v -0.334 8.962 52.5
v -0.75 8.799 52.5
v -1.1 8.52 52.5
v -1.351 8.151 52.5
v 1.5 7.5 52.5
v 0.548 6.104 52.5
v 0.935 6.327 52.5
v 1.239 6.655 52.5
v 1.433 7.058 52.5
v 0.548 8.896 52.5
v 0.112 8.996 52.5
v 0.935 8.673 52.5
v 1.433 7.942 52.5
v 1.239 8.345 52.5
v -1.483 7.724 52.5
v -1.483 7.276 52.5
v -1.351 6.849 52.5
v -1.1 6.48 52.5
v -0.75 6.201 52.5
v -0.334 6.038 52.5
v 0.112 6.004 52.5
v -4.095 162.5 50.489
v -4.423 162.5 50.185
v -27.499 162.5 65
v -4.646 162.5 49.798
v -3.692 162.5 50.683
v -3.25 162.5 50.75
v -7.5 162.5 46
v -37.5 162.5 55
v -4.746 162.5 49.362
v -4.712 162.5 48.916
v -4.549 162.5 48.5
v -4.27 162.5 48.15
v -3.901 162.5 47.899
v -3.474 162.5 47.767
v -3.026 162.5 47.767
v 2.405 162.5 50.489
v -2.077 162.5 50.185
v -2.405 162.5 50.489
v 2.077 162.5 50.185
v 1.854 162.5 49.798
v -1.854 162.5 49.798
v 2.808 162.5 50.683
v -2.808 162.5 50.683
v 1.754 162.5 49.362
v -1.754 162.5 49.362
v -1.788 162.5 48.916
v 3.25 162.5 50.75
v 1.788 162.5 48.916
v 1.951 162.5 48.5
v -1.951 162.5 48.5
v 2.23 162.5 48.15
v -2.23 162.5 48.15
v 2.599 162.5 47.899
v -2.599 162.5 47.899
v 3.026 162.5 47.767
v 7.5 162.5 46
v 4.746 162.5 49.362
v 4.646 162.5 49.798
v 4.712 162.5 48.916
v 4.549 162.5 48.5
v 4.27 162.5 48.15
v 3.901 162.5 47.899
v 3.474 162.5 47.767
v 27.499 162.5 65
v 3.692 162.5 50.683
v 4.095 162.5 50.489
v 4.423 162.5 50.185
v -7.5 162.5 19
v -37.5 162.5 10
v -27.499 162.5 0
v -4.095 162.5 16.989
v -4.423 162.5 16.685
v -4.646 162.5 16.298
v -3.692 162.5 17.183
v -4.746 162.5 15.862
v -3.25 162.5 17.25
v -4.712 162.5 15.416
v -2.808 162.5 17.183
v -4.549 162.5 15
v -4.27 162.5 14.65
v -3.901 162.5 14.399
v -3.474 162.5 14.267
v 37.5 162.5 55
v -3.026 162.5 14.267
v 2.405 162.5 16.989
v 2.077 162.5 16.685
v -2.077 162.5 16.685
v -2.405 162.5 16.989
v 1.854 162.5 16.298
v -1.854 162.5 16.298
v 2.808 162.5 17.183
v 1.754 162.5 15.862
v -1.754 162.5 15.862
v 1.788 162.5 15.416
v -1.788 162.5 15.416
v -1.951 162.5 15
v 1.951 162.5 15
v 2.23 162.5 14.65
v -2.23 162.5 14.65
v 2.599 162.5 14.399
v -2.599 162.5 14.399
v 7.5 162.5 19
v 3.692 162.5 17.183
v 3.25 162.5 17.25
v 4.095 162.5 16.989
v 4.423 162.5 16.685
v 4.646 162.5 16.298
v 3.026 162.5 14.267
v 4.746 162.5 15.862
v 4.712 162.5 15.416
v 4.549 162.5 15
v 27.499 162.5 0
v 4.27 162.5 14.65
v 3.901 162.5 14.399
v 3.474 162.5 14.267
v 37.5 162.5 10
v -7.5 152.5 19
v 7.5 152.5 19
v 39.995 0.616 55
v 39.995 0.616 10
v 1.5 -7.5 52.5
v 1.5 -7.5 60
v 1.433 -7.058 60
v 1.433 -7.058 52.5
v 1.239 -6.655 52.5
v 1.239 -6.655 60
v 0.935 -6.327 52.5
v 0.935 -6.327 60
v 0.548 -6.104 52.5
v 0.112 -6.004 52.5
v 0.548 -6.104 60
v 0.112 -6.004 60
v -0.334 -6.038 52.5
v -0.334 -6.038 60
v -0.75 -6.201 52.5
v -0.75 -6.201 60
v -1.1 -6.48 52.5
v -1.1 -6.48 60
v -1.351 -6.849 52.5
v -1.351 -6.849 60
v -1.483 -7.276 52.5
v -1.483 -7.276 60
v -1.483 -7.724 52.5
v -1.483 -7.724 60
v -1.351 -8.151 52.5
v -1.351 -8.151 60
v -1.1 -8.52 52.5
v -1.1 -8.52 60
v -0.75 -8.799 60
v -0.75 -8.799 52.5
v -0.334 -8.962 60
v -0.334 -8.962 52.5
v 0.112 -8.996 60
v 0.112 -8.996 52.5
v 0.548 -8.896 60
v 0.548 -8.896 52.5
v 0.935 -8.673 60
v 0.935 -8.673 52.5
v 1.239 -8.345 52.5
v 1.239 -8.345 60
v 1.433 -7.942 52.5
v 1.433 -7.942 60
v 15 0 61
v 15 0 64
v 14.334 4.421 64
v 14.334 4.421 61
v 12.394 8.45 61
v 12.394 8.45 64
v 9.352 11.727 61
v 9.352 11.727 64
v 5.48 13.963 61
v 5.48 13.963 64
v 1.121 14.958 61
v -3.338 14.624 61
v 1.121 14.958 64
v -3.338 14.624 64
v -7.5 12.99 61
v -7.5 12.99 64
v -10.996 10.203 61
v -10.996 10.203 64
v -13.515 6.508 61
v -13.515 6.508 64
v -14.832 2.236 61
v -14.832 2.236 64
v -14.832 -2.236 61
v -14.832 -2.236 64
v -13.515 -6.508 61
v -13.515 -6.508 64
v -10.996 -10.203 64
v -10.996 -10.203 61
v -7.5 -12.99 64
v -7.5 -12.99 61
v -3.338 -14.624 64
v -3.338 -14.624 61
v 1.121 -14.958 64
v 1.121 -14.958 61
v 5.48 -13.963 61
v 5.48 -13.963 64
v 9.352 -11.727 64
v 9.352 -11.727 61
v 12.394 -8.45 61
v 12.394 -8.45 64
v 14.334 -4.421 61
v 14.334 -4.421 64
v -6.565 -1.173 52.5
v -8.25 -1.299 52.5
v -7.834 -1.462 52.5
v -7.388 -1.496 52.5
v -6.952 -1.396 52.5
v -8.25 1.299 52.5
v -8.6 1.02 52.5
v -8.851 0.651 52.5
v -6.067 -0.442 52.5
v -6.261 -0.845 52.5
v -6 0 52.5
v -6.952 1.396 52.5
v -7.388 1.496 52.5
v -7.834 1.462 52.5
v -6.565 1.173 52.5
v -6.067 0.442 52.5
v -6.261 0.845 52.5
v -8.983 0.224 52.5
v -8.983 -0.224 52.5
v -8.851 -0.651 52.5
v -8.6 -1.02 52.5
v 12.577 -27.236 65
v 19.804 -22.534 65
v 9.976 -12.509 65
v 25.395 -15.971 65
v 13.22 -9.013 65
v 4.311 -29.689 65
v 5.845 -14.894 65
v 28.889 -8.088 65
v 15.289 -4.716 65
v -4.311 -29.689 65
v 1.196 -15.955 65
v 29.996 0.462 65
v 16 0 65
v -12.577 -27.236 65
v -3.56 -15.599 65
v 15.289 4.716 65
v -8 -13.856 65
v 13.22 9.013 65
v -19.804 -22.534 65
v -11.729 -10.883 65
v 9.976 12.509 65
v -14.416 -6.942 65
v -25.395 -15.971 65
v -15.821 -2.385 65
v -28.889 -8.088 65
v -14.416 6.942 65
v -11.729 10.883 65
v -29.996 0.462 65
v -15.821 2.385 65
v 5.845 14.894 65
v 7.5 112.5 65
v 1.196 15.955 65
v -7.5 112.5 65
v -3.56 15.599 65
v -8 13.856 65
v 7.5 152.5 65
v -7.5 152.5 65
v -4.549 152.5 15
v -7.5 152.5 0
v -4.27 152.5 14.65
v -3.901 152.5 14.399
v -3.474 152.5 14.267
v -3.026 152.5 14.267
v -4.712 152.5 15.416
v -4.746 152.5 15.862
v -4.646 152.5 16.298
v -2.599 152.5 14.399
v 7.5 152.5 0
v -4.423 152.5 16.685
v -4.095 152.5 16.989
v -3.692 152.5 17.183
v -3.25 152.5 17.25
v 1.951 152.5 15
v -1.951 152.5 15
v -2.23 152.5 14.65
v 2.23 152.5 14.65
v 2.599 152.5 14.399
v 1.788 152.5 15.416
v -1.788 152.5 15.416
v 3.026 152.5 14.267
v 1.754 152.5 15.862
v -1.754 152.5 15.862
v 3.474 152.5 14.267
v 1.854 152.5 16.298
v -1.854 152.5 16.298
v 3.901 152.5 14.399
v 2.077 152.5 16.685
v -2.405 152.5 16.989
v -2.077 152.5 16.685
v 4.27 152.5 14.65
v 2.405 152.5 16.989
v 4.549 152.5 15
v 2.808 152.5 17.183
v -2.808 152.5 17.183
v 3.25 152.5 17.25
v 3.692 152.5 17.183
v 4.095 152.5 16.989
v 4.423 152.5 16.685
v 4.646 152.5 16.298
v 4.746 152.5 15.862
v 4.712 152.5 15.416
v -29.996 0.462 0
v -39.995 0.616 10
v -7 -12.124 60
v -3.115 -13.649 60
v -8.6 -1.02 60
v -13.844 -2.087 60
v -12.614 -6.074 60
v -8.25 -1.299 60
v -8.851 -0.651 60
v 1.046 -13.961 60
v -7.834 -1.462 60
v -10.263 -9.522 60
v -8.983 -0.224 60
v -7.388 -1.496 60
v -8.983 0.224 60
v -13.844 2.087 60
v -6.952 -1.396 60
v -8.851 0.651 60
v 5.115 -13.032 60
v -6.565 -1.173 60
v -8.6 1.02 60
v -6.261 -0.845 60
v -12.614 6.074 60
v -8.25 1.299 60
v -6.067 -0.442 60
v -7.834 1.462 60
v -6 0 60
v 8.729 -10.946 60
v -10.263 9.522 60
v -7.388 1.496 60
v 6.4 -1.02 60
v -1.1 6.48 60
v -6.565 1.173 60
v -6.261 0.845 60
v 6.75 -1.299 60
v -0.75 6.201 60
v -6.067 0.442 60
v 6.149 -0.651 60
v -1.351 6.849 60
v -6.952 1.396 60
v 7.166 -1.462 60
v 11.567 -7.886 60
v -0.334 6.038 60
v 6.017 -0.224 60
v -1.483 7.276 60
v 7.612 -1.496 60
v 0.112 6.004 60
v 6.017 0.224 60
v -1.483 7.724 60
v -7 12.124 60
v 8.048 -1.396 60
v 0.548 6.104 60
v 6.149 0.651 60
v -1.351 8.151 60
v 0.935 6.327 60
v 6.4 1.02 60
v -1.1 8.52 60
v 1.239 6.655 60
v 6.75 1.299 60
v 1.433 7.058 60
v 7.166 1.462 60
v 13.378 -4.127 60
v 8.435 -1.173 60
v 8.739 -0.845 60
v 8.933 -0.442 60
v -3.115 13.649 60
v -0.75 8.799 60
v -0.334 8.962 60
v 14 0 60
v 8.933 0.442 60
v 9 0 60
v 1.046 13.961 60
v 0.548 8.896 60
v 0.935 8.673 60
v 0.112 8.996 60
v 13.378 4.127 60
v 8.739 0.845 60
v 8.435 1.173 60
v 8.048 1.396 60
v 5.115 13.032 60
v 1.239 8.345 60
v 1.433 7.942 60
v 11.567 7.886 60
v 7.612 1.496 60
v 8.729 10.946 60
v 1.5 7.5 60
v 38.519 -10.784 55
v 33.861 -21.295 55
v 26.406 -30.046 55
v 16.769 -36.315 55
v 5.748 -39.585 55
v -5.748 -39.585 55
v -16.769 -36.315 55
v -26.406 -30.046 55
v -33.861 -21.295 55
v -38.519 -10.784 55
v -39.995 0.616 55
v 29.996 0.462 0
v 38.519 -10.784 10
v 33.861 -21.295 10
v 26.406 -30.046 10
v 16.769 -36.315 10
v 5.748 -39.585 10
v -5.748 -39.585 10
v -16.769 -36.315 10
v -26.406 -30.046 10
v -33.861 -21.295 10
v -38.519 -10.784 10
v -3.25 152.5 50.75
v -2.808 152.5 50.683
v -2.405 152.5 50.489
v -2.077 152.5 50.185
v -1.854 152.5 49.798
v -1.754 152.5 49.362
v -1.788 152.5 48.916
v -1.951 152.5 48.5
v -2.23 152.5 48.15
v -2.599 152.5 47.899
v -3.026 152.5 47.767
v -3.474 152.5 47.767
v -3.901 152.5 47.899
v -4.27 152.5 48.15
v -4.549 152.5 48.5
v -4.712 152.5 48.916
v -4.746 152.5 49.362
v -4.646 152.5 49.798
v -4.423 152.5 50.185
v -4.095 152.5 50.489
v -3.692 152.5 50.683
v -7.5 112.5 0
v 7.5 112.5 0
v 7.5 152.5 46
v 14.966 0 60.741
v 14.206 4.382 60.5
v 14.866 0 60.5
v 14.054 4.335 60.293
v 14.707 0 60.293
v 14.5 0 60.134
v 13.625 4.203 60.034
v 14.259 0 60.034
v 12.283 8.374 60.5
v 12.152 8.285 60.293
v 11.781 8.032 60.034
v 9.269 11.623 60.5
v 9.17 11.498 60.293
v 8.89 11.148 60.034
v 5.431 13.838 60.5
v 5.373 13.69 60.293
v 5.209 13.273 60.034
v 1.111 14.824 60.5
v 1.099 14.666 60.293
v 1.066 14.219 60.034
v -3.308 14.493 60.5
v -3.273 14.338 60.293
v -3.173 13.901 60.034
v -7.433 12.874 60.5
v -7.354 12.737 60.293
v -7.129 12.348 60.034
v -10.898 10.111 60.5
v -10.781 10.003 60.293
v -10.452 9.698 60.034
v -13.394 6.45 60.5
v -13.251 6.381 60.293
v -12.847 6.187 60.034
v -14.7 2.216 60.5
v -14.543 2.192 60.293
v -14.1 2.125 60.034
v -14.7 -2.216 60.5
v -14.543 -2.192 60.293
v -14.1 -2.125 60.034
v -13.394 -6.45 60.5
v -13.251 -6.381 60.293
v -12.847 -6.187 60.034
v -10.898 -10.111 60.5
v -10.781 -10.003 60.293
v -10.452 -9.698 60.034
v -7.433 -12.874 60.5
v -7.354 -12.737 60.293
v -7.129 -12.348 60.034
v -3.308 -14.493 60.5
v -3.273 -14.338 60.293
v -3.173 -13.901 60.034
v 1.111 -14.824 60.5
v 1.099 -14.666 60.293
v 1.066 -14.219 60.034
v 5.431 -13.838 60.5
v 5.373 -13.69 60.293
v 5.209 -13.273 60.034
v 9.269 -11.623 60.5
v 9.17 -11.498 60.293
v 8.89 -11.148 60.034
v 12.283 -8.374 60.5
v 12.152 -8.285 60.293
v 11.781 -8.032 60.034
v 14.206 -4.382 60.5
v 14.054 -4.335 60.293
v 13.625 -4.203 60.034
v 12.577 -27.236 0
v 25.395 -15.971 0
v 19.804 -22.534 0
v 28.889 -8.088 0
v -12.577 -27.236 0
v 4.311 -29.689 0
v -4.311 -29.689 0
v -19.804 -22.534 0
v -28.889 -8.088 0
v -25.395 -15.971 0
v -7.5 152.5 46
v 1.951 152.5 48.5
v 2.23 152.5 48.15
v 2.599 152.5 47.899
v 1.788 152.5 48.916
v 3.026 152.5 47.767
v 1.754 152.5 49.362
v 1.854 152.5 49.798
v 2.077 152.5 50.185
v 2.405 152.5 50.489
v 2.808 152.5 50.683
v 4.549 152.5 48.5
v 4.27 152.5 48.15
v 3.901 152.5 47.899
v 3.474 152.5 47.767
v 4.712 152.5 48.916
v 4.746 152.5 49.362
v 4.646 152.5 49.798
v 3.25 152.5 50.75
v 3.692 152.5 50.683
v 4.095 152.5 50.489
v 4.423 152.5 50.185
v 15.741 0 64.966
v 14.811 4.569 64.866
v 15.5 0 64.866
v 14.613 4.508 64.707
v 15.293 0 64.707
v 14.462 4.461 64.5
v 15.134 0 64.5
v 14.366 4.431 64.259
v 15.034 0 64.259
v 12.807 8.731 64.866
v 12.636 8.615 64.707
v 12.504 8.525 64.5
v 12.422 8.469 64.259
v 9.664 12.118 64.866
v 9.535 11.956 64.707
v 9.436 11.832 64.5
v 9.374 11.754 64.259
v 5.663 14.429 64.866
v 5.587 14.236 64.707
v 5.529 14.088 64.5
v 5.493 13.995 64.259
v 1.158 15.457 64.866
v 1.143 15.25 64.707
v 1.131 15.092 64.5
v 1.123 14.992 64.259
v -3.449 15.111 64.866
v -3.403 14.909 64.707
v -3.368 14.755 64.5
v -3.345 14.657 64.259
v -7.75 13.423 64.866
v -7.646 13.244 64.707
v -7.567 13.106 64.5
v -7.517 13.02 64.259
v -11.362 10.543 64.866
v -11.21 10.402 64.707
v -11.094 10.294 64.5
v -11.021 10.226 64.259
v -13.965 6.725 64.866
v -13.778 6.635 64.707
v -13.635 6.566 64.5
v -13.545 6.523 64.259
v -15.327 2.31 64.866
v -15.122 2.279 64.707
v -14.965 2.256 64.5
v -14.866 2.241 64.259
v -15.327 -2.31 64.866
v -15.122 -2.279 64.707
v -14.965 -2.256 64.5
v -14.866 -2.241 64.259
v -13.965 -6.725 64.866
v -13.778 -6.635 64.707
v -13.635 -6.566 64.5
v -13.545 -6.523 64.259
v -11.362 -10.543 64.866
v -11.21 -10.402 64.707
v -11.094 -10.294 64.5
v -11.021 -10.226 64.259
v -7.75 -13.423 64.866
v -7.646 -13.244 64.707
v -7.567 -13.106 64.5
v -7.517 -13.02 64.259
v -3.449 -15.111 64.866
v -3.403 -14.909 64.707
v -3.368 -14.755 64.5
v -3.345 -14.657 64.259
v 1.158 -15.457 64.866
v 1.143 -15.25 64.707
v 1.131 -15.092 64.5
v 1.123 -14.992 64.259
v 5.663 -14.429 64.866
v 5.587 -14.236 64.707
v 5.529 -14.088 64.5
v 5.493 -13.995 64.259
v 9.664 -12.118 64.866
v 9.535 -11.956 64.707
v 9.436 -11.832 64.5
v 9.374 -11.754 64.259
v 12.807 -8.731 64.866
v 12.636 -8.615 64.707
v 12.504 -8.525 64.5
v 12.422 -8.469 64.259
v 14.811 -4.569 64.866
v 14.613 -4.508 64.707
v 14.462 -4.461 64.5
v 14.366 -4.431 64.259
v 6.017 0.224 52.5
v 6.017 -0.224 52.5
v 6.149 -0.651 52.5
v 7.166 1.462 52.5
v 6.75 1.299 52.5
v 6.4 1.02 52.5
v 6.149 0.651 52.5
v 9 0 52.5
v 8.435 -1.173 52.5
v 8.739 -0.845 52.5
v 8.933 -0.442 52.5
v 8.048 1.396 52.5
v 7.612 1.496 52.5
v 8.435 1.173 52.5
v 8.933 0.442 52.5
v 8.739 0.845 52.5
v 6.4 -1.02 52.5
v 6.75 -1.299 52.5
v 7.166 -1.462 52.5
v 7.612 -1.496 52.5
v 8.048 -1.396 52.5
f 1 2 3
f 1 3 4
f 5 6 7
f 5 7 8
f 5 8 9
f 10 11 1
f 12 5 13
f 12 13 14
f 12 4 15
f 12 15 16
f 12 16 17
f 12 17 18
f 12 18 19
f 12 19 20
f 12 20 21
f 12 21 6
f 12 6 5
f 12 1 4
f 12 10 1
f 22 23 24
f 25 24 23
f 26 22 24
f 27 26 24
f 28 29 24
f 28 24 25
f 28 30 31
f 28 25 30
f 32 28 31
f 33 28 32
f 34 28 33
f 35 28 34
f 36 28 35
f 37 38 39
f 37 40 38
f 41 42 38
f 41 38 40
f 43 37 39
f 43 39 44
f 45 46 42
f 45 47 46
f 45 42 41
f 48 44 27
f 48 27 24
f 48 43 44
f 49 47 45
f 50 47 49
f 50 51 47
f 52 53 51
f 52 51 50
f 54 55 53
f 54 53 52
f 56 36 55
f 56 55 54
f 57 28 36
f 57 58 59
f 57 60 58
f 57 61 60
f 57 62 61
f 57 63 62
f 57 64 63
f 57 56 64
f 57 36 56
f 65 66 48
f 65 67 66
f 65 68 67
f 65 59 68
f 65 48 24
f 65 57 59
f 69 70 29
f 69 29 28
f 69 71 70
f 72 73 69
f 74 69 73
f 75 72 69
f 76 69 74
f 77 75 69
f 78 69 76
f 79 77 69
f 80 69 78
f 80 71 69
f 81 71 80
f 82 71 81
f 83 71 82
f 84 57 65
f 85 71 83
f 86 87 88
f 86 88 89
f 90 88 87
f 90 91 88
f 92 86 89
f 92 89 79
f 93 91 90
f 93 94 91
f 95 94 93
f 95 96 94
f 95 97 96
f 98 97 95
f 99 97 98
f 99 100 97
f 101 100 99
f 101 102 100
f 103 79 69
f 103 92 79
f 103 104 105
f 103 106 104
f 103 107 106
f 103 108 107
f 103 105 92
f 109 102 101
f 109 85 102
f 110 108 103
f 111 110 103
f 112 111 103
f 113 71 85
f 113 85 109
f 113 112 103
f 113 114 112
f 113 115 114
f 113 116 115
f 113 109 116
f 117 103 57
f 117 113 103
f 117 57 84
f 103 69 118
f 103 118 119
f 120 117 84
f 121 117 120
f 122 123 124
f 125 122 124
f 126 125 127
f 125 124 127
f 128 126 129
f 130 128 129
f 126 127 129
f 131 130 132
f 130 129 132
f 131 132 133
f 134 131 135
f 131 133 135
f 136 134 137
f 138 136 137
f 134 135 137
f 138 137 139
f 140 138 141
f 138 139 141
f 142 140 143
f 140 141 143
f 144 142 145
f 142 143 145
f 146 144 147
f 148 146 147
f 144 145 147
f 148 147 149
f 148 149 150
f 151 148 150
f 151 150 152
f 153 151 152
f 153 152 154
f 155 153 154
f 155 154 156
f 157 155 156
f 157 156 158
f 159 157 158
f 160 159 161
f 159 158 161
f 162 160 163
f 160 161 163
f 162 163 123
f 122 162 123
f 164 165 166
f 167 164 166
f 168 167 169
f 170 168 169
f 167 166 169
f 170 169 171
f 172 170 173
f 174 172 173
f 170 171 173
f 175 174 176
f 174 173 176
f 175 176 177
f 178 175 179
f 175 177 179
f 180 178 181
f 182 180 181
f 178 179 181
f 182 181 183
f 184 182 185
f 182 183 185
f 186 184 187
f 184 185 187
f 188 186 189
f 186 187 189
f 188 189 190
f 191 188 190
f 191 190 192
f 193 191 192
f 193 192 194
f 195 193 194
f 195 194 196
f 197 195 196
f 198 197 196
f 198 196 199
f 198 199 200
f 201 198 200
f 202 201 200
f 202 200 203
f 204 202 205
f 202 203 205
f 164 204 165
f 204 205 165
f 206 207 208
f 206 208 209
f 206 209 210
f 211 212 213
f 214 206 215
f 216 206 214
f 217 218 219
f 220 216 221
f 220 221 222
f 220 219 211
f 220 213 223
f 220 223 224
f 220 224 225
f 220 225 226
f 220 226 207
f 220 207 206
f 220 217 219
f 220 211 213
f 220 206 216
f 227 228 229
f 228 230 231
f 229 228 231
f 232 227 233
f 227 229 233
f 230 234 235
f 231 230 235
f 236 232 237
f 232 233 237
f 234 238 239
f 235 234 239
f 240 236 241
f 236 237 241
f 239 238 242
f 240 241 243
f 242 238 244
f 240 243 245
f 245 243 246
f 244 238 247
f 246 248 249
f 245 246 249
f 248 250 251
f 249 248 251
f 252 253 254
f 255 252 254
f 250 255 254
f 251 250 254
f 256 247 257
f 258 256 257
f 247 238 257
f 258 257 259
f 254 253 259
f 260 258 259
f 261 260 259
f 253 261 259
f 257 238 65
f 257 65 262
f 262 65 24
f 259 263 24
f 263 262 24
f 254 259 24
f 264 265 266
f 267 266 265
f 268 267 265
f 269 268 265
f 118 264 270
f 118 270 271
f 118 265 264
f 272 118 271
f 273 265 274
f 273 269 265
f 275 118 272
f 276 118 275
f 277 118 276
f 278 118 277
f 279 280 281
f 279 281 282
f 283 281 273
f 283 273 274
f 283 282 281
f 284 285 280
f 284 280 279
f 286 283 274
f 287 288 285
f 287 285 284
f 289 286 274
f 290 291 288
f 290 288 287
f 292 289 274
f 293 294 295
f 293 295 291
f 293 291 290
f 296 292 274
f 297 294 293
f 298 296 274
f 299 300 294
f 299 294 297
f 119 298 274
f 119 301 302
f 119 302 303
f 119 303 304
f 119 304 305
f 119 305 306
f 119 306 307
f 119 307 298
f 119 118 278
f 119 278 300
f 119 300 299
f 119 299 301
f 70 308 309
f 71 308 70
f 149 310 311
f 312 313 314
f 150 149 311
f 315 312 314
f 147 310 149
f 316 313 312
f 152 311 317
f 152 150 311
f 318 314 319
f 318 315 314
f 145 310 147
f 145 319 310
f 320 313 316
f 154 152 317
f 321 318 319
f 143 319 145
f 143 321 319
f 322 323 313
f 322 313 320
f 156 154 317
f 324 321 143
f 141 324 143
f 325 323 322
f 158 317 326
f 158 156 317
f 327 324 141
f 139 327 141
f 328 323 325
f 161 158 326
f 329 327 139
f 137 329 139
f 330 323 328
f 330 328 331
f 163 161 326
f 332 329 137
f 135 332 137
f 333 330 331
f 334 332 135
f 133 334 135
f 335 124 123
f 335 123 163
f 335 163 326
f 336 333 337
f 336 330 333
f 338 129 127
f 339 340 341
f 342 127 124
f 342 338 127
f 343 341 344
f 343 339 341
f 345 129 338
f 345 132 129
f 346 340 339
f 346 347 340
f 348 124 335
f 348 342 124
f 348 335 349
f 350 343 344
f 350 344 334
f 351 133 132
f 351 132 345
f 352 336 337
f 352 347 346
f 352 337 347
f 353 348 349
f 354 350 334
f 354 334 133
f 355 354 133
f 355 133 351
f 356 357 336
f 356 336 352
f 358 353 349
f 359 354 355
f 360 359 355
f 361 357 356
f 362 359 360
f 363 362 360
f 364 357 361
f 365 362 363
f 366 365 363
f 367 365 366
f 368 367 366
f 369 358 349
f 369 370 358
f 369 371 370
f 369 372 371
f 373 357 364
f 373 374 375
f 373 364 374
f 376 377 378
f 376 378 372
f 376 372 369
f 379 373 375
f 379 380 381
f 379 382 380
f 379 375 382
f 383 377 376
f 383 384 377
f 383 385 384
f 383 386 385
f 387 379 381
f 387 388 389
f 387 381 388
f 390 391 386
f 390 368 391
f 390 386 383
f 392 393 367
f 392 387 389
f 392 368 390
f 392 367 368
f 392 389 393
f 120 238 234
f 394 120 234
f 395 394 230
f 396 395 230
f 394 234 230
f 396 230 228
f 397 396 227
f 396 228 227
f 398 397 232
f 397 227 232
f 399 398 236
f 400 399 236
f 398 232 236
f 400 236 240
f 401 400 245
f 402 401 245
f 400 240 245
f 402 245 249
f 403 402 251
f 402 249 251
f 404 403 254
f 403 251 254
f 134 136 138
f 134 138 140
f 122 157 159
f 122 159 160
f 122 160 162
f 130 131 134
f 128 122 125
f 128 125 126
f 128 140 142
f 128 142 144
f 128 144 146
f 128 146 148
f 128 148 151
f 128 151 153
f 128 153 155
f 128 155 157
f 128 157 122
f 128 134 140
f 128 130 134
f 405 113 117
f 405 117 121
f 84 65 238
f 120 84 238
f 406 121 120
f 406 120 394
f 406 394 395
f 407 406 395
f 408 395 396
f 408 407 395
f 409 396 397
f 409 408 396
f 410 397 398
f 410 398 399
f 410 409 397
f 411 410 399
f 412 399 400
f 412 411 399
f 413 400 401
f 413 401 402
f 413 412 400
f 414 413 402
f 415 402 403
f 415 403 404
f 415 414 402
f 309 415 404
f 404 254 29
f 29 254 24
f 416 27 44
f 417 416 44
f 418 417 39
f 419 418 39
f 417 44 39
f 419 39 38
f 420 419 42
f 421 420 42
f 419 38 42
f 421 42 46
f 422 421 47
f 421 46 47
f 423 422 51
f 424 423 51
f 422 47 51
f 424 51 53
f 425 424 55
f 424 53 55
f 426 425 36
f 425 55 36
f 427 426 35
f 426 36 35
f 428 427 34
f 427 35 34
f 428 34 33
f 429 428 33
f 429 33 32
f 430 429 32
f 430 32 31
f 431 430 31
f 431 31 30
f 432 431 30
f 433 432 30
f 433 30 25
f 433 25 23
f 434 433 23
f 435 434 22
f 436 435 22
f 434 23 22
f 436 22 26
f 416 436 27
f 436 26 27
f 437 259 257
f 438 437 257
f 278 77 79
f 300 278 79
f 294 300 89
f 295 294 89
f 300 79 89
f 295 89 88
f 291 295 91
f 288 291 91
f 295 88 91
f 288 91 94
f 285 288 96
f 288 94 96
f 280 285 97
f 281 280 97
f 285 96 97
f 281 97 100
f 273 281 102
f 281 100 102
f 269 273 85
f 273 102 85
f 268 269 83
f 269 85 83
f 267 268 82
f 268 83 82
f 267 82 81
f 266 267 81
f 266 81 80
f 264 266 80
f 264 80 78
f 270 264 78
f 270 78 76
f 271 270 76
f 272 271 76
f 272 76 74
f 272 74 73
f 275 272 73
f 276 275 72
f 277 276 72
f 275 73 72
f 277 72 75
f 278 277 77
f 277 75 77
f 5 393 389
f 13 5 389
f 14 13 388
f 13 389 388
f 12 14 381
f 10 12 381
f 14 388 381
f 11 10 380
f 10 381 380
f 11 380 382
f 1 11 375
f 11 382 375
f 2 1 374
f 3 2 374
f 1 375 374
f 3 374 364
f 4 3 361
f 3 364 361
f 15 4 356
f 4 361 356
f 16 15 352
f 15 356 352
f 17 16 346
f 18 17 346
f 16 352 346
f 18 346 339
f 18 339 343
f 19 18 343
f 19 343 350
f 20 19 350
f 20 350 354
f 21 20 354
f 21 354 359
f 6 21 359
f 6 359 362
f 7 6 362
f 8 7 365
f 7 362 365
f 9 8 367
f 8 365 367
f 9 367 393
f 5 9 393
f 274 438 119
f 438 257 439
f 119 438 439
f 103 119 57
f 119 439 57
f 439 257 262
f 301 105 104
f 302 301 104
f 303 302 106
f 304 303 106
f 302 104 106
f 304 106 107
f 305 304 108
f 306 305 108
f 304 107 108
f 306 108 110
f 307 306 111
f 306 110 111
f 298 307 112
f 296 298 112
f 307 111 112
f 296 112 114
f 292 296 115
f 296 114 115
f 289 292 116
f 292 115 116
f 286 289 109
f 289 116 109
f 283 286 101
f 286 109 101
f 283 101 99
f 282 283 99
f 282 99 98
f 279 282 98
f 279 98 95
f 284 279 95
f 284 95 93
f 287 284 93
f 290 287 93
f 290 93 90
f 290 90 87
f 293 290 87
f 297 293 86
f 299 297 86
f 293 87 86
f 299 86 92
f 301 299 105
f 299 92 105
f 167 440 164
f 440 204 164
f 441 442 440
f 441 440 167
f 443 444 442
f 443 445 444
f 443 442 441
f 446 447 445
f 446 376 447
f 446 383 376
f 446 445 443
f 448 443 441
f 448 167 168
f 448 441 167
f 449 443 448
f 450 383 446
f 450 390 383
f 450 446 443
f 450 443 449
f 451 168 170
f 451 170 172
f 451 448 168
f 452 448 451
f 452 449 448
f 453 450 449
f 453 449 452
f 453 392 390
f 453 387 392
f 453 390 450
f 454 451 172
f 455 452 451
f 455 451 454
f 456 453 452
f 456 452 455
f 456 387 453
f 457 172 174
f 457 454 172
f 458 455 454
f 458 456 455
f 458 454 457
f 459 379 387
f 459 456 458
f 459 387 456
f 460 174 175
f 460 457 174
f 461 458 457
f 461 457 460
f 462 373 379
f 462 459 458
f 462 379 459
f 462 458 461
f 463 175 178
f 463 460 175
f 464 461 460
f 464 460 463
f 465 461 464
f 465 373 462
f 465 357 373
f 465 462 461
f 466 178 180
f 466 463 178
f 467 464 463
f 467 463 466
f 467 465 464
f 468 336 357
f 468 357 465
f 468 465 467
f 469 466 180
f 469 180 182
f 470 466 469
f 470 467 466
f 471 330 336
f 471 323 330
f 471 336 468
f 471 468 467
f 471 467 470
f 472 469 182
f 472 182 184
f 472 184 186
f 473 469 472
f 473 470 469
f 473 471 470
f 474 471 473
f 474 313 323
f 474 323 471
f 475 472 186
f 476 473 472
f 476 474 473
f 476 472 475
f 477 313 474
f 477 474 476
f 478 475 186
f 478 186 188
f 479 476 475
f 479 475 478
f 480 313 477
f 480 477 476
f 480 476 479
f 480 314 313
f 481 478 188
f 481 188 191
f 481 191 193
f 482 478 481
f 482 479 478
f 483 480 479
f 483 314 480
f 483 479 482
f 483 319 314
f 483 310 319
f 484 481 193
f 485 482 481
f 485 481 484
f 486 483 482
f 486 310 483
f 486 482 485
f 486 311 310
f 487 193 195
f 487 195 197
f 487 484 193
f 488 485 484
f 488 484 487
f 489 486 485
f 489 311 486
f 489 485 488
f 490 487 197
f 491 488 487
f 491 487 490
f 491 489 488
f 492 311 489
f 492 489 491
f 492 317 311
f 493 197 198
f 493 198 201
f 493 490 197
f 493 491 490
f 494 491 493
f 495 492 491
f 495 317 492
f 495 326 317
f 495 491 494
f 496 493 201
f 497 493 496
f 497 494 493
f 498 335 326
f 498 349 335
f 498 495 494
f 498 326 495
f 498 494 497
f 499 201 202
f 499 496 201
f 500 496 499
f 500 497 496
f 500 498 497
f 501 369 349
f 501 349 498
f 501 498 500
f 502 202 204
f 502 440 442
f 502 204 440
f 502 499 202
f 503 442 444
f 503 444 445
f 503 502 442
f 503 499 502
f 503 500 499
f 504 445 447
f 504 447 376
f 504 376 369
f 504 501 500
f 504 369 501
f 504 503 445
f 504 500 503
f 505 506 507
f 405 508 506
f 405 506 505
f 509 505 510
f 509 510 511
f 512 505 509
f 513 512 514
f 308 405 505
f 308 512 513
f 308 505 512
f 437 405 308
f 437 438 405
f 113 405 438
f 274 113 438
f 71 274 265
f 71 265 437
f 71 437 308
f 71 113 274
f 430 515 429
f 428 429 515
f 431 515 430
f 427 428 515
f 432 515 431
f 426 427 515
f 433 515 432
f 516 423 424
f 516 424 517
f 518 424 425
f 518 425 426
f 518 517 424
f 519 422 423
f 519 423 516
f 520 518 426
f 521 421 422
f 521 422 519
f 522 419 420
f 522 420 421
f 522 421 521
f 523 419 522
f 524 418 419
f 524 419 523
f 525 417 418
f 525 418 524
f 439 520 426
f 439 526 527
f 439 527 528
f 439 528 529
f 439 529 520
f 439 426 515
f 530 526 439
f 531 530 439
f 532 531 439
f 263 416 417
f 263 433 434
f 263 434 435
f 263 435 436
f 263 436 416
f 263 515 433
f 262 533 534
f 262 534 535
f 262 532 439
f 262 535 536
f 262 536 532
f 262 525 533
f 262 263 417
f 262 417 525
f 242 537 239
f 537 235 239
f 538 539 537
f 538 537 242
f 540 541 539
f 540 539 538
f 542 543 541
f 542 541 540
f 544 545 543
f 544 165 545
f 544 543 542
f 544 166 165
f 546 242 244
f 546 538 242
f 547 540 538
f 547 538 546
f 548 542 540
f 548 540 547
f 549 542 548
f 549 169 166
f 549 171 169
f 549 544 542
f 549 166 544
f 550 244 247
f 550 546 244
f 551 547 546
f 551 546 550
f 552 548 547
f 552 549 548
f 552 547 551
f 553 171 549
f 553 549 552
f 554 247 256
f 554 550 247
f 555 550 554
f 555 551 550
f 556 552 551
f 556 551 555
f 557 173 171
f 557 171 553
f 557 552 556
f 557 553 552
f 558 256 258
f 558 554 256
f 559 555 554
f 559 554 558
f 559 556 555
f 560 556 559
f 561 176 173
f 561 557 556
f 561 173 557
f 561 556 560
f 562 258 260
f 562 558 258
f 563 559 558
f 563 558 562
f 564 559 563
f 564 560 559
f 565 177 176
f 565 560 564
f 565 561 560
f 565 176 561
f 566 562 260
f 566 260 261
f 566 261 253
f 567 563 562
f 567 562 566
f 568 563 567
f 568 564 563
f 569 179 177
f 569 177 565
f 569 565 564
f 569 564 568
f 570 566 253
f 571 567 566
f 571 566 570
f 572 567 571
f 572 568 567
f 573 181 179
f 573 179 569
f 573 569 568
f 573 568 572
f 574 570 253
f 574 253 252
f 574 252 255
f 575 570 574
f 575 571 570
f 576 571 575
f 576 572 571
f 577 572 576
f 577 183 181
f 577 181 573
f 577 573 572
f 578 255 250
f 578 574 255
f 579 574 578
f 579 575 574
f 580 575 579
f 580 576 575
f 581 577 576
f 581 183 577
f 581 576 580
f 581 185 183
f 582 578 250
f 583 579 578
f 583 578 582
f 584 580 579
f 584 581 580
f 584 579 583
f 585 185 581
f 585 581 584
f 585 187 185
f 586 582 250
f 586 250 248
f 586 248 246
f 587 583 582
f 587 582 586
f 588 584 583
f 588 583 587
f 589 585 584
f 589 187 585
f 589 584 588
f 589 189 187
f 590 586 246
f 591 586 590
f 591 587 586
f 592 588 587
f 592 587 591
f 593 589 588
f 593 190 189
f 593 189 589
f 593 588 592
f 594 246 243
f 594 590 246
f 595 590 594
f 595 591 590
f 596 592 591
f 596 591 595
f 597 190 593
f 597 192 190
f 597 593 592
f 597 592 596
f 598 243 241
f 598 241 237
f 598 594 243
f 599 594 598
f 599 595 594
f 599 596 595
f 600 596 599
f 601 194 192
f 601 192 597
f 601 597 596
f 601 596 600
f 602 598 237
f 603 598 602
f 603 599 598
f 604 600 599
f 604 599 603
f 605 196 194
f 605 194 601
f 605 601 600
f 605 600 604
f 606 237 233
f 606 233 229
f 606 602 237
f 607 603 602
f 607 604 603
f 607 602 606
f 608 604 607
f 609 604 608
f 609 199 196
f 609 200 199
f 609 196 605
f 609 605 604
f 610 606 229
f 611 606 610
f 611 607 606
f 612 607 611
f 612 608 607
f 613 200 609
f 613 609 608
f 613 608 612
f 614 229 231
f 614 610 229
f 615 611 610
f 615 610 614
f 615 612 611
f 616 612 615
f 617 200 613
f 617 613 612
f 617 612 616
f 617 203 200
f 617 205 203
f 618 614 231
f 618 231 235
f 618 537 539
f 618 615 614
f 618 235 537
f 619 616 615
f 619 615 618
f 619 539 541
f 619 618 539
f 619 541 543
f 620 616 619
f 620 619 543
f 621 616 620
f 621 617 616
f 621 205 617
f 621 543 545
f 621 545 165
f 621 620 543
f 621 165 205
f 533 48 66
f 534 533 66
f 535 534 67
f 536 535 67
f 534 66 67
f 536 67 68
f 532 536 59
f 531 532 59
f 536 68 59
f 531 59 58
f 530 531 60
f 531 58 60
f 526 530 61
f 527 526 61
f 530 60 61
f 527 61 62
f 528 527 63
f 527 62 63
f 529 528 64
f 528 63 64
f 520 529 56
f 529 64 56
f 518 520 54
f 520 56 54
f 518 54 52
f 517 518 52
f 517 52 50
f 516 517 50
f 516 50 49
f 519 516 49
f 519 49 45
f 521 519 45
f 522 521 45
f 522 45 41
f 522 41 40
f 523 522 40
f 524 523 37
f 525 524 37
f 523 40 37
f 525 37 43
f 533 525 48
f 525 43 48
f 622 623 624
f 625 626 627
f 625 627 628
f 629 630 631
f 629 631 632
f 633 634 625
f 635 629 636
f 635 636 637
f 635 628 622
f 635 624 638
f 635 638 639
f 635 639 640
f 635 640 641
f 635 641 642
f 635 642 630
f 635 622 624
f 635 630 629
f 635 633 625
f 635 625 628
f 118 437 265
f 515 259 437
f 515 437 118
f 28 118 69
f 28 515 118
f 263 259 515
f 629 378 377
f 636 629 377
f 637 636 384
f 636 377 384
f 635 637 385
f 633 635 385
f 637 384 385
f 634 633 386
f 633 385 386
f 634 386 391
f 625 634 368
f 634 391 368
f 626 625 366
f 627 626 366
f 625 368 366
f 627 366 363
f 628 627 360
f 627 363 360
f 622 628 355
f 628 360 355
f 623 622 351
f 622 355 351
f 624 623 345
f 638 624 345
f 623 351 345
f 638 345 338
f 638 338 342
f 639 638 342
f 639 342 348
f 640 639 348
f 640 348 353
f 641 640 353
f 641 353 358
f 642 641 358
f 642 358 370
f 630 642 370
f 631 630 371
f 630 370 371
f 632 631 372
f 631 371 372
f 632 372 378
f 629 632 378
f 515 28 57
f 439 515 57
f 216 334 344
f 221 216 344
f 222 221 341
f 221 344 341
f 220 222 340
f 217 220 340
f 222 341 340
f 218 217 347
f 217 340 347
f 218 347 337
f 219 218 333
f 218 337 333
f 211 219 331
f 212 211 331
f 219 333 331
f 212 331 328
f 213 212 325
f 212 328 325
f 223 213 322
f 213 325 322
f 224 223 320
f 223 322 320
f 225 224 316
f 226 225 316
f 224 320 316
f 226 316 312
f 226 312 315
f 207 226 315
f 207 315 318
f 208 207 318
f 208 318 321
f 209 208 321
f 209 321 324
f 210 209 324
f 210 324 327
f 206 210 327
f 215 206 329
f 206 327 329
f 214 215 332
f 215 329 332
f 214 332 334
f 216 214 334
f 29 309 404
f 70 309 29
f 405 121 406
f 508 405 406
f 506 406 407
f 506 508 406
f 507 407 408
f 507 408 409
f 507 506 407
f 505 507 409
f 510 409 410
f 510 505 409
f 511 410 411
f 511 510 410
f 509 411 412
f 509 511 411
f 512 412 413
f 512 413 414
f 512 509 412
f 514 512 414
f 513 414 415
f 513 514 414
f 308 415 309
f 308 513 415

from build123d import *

# Parameters (mm, degrees)
BOSS_EXTRUDE1_DEPTH = 65
CHAMFER1_SIZE       = 10
SKETCH2_R           = 15
CUT_EXTRUDE1_DEPTH  = 5
SKETCH3_R           = 1.5
CUT_EXTRUDE2_DEPTH  = 7.5
FILLET1_R           = 1
SKETCH4_W           = 15
SKETCH4_H           = 40
CUT_EXTRUDE3_DEPTH  = 180.530638054
SKETCH5_R           = 1.5
SKETCH5_W           = 15
SKETCH5_H           = 27
CUT_EXTRUDE4_DEPTH  = 10


with BuildPart() as part:
    # Sketch1 → Boss-Extrude1 (new body)
    with BuildSketch(Plane.XY):
        with BuildLine():
            Line((-37.5, 162.5), (37.5, 162.5))
            Line((37.5, 162.5), (39.995249108, 0.616480975))
            ThreePointArc((39.995249108, 0.616480975), (0, -40), (-39.995249108, 0.616480975))
            Line((-39.995249108, 0.616480975), (-37.5, 162.5))
        make_face()
    extrude(amount=BOSS_EXTRUDE1_DEPTH)

    # Chamfer1
    chamfer1_edges = [part.edges().sort_by_distance(p)[0] for p in [
        (-38.747624554, 81.558240488, 65),
        (0, -40, 65),
        (38.747624554, 81.558240488, 65),
        (0, -40, 0),
        (-38.747624554, 81.558240488, 0),
        (38.747624554, 81.558240488, 0),
    ]]
    chamfer(chamfer1_edges, length=CHAMFER1_SIZE)

    # Sketch2 → Cut-Extrude1 (cut)
    with BuildSketch(Plane.XY.offset(65)):
        Circle(SKETCH2_R)
    extrude(amount=-CUT_EXTRUDE1_DEPTH, mode=Mode.SUBTRACT)

    # Sketch3 → Cut-Extrude2 (cut)
    with BuildSketch(Plane.XY.offset(60)):
        with Locations((0, 7.5)):
            Circle(SKETCH3_R)
        with Locations((7.5, 0)):
            Circle(SKETCH3_R)
        with Locations((0, -7.5)):
            Circle(SKETCH3_R)
        with Locations((-7.5, 0)):
            Circle(SKETCH3_R)
    extrude(amount=-CUT_EXTRUDE2_DEPTH, mode=Mode.SUBTRACT)

    # Fillet1
    fillet1_edges = [part.edges().sort_by_distance(p)[0] for p in [
        (-15, 0, 60),
        (-15, 0, 65),
    ]]
    fillet(fillet1_edges, radius=FILLET1_R)

    # Sketch4 → Cut-Extrude3 (cut, through all)
    with BuildSketch(Plane.XY.offset(65)):
        with Locations((0, 132.5)):
            Rectangle(SKETCH4_W, SKETCH4_H)
    extrude(amount=-CUT_EXTRUDE3_DEPTH, mode=Mode.SUBTRACT)

    # Sketch5 → Cut-Extrude4 (cut)
    with BuildSketch(Plane(origin=(0, 162.5, 0), x_dir=(1, 0, 0), z_dir=(0, 1, 0))):
        with Locations(Location((-3.25, -15.75, 0), (0, 0, 270))):
            Circle(SKETCH5_R)
        with Locations(Location((3.25, -15.75, 0), (0, 0, 270))):
            Circle(SKETCH5_R)
        with Locations(Location((3.25, -49.25, 0), (0, 0, 270))):
            Circle(SKETCH5_R)
        with Locations(Location((-3.25, -49.25, 0), (0, 0, 270))):
            Circle(SKETCH5_R)
        with Locations((0, -32.5)):
            Rectangle(SKETCH5_W, SKETCH5_H)
    extrude(amount=-CUT_EXTRUDE4_DEPTH, mode=Mode.SUBTRACT)


solid = part.part
